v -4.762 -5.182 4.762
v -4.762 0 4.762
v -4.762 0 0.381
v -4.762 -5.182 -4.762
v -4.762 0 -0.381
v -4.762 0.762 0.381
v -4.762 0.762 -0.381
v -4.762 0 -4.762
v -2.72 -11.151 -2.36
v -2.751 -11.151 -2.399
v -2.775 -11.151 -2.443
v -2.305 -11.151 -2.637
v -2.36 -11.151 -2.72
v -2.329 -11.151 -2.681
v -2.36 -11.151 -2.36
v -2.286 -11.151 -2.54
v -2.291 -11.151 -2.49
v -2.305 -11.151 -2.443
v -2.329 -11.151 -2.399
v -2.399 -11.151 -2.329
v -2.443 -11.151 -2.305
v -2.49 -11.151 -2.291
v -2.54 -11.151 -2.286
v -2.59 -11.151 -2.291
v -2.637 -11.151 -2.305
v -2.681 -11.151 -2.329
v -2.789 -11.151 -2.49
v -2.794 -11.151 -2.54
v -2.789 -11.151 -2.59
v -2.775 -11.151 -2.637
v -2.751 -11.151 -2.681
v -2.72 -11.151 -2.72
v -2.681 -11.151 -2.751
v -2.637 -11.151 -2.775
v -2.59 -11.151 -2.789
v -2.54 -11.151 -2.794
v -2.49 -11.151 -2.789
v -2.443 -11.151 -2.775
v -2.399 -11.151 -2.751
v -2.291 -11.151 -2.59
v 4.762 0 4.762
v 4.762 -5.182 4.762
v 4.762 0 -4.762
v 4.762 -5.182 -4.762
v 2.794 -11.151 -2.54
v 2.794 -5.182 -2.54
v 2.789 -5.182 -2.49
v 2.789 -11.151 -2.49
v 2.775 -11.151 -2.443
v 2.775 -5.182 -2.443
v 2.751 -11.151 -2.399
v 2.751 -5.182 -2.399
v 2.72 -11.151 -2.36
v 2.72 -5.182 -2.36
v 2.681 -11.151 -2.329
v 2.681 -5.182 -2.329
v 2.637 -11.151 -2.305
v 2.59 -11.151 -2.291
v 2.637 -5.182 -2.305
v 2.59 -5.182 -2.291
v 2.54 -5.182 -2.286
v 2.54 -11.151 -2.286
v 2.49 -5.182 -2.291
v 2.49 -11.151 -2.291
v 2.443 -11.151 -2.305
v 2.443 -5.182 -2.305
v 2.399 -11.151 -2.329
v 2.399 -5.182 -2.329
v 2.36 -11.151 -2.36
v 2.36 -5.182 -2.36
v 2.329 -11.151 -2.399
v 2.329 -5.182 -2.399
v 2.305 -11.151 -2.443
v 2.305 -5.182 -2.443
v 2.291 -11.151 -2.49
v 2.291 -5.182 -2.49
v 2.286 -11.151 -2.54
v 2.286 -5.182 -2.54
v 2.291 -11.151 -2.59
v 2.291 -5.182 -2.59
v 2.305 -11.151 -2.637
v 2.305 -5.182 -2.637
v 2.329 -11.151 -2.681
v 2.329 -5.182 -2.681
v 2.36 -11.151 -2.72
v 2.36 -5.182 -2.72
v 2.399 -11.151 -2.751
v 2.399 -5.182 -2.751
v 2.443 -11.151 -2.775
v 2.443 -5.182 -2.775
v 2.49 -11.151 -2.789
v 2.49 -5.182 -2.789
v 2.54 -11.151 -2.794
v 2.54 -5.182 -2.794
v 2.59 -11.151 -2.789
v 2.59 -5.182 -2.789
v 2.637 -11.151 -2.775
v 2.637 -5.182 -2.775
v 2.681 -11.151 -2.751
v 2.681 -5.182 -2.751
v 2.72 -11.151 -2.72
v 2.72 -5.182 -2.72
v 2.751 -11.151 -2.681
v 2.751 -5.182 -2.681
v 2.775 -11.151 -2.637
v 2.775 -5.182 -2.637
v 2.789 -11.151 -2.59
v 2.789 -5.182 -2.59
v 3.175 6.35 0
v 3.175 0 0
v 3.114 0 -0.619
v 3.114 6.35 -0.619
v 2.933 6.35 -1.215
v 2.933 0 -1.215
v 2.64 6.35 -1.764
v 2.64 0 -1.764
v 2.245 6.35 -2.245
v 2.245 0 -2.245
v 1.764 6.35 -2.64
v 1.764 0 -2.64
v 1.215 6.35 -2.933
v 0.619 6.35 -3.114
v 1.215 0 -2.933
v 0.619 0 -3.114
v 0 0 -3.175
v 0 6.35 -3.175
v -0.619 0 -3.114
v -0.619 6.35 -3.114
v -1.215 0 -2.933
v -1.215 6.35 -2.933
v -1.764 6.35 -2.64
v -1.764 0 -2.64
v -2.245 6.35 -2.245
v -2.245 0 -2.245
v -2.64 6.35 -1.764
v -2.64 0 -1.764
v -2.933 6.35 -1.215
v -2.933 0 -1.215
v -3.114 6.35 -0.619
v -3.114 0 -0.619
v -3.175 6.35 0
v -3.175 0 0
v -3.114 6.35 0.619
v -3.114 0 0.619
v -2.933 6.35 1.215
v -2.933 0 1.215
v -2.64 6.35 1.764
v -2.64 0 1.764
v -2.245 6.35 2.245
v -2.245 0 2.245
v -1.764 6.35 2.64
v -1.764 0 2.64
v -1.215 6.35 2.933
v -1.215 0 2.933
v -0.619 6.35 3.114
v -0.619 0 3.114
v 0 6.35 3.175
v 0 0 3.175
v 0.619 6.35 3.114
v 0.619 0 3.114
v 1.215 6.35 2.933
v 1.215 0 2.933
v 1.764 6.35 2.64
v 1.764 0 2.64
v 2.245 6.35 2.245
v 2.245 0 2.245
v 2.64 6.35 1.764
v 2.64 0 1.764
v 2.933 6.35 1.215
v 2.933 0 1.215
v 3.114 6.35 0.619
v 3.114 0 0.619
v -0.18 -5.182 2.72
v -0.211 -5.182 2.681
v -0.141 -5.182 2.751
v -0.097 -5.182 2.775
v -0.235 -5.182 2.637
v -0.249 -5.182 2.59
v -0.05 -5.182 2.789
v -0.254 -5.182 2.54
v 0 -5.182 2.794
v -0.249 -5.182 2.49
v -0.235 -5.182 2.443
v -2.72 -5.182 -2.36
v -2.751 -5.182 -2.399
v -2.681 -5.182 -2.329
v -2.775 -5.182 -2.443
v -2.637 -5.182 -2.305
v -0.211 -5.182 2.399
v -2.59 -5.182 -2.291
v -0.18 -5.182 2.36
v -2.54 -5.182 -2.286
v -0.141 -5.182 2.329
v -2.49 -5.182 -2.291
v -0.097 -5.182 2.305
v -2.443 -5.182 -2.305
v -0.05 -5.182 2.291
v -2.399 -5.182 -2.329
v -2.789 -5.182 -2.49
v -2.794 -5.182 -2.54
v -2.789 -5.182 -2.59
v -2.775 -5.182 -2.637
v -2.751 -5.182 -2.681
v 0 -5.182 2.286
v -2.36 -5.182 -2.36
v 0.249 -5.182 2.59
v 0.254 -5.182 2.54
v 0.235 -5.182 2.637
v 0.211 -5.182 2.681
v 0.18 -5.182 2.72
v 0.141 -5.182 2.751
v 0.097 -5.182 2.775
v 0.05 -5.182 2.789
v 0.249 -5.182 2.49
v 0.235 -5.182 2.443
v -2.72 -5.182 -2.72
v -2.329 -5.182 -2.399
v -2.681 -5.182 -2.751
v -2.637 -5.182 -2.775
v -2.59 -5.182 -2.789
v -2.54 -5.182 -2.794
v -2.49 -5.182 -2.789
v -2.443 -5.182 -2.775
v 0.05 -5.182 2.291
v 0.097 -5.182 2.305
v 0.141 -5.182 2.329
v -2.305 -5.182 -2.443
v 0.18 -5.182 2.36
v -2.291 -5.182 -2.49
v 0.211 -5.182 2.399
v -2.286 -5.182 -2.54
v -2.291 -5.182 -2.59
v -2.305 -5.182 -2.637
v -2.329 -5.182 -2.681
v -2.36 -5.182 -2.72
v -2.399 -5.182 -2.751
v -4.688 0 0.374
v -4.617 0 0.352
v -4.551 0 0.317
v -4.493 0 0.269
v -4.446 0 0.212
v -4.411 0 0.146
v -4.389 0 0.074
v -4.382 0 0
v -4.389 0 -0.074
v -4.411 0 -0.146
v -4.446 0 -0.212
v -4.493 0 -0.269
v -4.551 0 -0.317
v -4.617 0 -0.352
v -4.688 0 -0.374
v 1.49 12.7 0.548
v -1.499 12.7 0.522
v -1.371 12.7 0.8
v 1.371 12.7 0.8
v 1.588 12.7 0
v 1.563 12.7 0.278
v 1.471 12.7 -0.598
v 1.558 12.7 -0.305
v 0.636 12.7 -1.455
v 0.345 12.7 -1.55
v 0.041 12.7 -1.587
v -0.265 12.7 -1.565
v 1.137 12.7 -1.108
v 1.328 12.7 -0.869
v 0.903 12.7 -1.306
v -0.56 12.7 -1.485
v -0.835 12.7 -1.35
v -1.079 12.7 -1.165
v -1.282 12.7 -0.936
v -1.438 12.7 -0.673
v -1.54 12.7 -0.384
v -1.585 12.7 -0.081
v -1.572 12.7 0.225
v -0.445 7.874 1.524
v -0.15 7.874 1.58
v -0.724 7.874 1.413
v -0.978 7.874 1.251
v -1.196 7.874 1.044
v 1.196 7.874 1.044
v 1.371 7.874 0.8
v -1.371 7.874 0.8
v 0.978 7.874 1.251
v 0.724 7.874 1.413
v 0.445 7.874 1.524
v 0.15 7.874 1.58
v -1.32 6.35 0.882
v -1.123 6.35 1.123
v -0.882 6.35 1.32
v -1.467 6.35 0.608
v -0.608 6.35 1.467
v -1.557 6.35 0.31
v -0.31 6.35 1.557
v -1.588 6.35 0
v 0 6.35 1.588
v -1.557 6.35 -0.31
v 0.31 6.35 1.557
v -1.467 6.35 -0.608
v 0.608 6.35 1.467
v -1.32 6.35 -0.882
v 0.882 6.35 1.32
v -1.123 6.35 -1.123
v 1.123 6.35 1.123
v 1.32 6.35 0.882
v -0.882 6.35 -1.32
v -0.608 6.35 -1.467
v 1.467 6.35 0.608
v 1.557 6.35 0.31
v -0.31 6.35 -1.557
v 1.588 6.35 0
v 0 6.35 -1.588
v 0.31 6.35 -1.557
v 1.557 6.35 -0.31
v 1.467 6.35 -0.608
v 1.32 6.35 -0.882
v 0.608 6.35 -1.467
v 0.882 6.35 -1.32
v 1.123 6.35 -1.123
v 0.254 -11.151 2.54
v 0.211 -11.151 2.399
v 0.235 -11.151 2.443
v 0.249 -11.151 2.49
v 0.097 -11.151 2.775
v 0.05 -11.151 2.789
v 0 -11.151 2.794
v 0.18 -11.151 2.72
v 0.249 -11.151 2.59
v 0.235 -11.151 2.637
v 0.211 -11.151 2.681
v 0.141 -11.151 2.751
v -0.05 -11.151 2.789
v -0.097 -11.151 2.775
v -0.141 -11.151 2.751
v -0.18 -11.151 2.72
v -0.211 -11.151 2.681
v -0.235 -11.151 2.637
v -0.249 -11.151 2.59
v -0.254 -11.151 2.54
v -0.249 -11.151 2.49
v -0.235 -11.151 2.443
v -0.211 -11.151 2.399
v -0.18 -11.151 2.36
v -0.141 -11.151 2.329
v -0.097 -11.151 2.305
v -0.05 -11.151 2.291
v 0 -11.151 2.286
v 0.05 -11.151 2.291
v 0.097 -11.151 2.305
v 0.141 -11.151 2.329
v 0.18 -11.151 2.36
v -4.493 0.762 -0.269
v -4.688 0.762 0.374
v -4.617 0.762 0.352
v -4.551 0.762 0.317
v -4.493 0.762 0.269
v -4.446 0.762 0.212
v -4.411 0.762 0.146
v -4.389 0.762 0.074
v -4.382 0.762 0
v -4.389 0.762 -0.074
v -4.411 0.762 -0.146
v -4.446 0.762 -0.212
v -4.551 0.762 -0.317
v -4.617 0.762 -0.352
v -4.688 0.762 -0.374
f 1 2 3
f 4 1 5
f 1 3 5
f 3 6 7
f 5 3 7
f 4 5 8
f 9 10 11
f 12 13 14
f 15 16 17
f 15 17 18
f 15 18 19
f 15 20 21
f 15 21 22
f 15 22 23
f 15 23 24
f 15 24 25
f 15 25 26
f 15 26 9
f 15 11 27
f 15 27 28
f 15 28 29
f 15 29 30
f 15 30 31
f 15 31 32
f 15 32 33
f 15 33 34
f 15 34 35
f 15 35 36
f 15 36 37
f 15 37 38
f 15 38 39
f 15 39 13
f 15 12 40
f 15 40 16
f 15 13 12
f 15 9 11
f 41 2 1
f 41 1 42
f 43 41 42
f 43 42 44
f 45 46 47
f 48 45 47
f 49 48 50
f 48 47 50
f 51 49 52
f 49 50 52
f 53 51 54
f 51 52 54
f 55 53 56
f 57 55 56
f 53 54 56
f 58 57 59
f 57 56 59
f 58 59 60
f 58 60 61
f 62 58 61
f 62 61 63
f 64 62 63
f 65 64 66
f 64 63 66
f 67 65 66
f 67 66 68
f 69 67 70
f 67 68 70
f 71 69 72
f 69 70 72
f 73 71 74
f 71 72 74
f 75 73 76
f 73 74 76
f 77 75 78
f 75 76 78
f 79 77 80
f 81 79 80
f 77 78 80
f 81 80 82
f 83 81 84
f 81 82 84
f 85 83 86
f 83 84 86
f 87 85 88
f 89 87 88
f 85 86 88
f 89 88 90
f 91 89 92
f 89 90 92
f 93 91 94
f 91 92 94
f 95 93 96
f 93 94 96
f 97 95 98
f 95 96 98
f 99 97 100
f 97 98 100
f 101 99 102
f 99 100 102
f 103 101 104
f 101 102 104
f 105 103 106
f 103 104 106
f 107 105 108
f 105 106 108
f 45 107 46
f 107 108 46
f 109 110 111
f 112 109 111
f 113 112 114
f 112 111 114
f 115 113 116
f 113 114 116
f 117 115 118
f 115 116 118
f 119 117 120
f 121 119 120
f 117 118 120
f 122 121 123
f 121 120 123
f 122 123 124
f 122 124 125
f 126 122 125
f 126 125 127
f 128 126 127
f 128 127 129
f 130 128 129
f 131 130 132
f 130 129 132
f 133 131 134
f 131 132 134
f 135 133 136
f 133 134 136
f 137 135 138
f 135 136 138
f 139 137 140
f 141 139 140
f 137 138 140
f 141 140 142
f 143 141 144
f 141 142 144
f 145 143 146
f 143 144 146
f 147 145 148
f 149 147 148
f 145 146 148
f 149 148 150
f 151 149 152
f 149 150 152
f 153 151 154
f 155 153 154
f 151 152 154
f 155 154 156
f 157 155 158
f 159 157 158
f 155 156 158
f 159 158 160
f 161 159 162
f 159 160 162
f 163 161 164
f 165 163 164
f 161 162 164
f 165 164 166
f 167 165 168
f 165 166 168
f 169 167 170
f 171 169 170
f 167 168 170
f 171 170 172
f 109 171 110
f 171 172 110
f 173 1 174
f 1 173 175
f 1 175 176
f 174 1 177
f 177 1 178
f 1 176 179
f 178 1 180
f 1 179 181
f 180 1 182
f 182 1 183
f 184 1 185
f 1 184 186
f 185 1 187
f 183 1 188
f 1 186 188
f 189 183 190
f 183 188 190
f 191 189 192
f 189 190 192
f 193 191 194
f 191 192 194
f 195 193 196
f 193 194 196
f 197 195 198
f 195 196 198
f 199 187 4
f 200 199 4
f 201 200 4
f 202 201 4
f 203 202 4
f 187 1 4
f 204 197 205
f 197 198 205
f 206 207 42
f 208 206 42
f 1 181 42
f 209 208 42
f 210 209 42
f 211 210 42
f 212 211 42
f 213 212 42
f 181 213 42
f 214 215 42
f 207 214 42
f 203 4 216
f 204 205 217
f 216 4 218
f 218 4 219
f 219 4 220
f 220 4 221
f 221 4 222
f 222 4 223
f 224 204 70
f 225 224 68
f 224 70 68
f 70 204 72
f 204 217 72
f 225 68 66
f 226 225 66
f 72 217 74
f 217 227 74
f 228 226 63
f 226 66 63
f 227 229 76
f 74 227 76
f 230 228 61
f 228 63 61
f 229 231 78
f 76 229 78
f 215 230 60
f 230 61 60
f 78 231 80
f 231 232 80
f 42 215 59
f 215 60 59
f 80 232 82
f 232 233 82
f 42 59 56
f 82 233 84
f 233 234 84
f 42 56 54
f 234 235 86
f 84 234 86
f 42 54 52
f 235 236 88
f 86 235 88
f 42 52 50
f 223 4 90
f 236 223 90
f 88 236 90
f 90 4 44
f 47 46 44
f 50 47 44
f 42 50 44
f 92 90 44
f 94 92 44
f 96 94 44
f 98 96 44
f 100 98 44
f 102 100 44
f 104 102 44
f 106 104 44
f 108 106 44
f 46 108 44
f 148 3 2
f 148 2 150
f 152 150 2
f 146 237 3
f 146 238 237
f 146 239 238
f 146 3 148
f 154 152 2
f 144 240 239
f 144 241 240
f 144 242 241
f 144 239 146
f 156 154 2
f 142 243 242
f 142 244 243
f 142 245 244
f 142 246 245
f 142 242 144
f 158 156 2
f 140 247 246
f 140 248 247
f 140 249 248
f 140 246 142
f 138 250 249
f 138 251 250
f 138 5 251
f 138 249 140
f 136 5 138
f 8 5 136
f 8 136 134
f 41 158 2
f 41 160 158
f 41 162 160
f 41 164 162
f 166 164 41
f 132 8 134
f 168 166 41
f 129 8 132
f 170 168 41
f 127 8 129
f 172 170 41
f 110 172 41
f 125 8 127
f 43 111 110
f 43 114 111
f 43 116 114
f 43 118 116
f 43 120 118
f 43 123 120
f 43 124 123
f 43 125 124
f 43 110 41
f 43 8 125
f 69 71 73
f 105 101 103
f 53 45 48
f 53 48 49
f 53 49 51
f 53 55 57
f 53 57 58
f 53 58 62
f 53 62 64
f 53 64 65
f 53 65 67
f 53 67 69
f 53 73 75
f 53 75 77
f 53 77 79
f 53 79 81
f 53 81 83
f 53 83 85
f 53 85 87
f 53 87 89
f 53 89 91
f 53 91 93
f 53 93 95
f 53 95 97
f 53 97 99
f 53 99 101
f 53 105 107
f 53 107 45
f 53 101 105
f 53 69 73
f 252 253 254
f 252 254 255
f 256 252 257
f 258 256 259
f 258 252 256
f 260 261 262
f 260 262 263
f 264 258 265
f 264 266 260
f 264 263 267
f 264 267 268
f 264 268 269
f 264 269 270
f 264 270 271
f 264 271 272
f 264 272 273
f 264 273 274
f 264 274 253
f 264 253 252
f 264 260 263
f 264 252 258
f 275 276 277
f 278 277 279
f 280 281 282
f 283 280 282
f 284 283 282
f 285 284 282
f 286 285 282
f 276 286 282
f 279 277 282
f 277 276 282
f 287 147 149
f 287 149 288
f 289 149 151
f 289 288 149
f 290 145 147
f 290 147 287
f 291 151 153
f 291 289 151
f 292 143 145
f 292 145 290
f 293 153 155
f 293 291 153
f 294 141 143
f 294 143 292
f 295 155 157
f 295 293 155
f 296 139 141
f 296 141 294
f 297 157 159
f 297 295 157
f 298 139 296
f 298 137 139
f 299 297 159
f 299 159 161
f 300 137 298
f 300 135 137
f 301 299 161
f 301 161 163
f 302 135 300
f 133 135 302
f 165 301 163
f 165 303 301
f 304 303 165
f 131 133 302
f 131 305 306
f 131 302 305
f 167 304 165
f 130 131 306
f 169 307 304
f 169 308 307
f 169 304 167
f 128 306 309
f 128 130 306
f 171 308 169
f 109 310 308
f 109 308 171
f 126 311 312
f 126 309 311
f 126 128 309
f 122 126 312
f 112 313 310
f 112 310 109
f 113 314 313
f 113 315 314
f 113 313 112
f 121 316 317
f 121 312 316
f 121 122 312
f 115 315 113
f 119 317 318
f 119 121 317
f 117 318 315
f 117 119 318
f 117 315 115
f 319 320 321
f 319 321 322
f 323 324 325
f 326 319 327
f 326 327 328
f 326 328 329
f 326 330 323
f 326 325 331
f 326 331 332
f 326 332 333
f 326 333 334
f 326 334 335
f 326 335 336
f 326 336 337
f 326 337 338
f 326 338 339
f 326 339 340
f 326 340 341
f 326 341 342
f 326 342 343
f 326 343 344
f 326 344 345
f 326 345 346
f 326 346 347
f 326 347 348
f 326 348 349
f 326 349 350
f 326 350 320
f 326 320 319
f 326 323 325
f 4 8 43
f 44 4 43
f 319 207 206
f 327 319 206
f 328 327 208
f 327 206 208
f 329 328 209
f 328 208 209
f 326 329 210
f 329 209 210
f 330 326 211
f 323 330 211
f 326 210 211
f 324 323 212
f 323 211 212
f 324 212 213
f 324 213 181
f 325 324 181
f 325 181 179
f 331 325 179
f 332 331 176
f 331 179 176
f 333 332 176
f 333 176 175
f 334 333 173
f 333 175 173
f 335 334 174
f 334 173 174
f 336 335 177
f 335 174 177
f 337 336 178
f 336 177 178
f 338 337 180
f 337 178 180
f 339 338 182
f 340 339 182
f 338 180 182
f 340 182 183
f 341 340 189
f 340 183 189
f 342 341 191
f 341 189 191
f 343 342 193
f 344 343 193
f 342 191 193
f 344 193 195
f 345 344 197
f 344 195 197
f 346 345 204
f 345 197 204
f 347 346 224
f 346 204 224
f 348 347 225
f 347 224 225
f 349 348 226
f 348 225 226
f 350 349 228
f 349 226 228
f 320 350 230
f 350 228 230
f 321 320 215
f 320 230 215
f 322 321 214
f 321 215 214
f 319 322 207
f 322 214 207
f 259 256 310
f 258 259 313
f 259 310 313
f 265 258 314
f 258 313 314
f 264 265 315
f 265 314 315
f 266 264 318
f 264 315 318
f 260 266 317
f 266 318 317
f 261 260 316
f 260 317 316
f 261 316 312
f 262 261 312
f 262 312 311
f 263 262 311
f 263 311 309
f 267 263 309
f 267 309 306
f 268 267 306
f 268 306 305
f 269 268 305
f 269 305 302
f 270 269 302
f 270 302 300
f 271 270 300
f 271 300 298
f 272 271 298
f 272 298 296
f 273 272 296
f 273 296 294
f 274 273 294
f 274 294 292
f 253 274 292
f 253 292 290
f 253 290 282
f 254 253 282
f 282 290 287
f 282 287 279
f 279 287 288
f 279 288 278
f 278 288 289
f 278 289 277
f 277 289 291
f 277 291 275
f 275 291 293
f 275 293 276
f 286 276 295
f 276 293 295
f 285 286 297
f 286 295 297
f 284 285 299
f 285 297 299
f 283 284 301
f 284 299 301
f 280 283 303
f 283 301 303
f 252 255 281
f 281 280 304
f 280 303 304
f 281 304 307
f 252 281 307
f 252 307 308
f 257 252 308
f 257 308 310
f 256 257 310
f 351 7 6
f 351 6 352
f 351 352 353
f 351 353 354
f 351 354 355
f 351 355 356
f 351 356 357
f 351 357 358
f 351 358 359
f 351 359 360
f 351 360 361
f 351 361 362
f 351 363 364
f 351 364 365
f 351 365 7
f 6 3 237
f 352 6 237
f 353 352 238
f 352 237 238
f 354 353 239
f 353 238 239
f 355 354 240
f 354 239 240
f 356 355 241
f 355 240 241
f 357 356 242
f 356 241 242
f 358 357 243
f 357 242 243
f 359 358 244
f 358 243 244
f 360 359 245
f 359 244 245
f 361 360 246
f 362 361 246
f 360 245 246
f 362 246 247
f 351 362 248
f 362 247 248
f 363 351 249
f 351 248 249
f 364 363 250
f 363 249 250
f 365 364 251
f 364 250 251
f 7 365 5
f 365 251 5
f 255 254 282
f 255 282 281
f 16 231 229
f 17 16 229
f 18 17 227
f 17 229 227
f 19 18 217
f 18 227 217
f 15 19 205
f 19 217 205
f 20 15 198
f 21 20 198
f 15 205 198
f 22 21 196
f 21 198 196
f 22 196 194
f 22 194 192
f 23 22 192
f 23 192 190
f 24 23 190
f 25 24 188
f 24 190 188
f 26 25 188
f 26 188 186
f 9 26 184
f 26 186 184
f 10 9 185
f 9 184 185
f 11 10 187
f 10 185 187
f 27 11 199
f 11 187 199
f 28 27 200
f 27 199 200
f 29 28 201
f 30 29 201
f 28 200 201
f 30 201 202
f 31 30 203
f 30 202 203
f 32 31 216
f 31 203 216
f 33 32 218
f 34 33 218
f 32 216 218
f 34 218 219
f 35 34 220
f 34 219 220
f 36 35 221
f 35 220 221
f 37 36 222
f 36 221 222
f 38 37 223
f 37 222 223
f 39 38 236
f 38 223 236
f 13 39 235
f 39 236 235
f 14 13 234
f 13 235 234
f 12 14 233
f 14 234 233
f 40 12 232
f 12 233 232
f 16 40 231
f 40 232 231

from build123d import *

# Parameters (mm, degrees)
SKETCH1_W           = 9.525
SKETCH1_H           = 9.525
BOSS_EXTRUDE1_DEPTH = 5.1816
SKETCH2_R           = 3.175
BOSS_EXTRUDE2_DEPTH = 6.35
BOSS_EXTRUDE3_DEPTH = 0.762
SKETCH4_R           = 1.5875
BOSS_EXTRUDE4_DEPTH = 6.35
CUT_EXTRUDE1_DEPTH  = 4.826
SKETCH6_R           = 0.254
BOSS_EXTRUDE5_DEPTH = 5.969


with BuildPart() as part:
    # Sketch1 → Boss-Extrude1 (new body)
    with BuildSketch(Plane(origin=(0, 0, 0), x_dir=(1, 0, 0), z_dir=(0, 1, 0))):
        Rectangle(SKETCH1_W, SKETCH1_H)
    extrude(amount=-BOSS_EXTRUDE1_DEPTH)

    # Sketch2 → Boss-Extrude2 (add)
    with BuildSketch(Plane(origin=(0, 0, 0), x_dir=(1, 0, 0), z_dir=(0, 1, 0))):
        Circle(SKETCH2_R)
    extrude(amount=BOSS_EXTRUDE2_DEPTH)

    # Sketch3 → Boss-Extrude3 (add)
    with BuildSketch(Plane(origin=(0, 0, 0), x_dir=(1, 0, 0), z_dir=(0, 1, 0))):
        with BuildLine():
            Line((-4.7625, 0.381), (-4.7625, -0.381))
            ThreePointArc((-4.7625, -0.381), (-4.3815, 0), (-4.7625, 0.381))
        make_face()
    extrude(amount=BOSS_EXTRUDE3_DEPTH)

    # Sketch4 → Boss-Extrude4 (add)
    with BuildSketch(Plane(origin=(0, 6.35, 0), x_dir=(1, 0, 0), z_dir=(0, 1, 0))):
        Circle(SKETCH4_R)
    extrude(amount=BOSS_EXTRUDE4_DEPTH)

    # Sketch5 → Cut-Extrude1 (cut)
    with BuildSketch(Plane(origin=(0, 12.7, 0), x_dir=(1, 0, 0), z_dir=(0, 1, 0))):
        with BuildLine():
            Line((-1.371129549, -0.8001), (1.371129549, -0.8001))
            ThreePointArc((1.371129549, -0.8001), (0, -1.5875), (-1.371129549, -0.8001))
        make_face()
    extrude(amount=-CUT_EXTRUDE1_DEPTH, mode=Mode.SUBTRACT)

    # Sketch6 → Boss-Extrude5 (add)
    with BuildSketch(Plane.XZ.offset(5.1816)):
        with Locations((0, 2.54)):
            Circle(SKETCH6_R)
        with Locations((-2.54, -2.54)):
            Circle(SKETCH6_R)
        with Locations((2.54, -2.54)):
            Circle(SKETCH6_R)
    extrude(amount=BOSS_EXTRUDE5_DEPTH)


solid = part.part
